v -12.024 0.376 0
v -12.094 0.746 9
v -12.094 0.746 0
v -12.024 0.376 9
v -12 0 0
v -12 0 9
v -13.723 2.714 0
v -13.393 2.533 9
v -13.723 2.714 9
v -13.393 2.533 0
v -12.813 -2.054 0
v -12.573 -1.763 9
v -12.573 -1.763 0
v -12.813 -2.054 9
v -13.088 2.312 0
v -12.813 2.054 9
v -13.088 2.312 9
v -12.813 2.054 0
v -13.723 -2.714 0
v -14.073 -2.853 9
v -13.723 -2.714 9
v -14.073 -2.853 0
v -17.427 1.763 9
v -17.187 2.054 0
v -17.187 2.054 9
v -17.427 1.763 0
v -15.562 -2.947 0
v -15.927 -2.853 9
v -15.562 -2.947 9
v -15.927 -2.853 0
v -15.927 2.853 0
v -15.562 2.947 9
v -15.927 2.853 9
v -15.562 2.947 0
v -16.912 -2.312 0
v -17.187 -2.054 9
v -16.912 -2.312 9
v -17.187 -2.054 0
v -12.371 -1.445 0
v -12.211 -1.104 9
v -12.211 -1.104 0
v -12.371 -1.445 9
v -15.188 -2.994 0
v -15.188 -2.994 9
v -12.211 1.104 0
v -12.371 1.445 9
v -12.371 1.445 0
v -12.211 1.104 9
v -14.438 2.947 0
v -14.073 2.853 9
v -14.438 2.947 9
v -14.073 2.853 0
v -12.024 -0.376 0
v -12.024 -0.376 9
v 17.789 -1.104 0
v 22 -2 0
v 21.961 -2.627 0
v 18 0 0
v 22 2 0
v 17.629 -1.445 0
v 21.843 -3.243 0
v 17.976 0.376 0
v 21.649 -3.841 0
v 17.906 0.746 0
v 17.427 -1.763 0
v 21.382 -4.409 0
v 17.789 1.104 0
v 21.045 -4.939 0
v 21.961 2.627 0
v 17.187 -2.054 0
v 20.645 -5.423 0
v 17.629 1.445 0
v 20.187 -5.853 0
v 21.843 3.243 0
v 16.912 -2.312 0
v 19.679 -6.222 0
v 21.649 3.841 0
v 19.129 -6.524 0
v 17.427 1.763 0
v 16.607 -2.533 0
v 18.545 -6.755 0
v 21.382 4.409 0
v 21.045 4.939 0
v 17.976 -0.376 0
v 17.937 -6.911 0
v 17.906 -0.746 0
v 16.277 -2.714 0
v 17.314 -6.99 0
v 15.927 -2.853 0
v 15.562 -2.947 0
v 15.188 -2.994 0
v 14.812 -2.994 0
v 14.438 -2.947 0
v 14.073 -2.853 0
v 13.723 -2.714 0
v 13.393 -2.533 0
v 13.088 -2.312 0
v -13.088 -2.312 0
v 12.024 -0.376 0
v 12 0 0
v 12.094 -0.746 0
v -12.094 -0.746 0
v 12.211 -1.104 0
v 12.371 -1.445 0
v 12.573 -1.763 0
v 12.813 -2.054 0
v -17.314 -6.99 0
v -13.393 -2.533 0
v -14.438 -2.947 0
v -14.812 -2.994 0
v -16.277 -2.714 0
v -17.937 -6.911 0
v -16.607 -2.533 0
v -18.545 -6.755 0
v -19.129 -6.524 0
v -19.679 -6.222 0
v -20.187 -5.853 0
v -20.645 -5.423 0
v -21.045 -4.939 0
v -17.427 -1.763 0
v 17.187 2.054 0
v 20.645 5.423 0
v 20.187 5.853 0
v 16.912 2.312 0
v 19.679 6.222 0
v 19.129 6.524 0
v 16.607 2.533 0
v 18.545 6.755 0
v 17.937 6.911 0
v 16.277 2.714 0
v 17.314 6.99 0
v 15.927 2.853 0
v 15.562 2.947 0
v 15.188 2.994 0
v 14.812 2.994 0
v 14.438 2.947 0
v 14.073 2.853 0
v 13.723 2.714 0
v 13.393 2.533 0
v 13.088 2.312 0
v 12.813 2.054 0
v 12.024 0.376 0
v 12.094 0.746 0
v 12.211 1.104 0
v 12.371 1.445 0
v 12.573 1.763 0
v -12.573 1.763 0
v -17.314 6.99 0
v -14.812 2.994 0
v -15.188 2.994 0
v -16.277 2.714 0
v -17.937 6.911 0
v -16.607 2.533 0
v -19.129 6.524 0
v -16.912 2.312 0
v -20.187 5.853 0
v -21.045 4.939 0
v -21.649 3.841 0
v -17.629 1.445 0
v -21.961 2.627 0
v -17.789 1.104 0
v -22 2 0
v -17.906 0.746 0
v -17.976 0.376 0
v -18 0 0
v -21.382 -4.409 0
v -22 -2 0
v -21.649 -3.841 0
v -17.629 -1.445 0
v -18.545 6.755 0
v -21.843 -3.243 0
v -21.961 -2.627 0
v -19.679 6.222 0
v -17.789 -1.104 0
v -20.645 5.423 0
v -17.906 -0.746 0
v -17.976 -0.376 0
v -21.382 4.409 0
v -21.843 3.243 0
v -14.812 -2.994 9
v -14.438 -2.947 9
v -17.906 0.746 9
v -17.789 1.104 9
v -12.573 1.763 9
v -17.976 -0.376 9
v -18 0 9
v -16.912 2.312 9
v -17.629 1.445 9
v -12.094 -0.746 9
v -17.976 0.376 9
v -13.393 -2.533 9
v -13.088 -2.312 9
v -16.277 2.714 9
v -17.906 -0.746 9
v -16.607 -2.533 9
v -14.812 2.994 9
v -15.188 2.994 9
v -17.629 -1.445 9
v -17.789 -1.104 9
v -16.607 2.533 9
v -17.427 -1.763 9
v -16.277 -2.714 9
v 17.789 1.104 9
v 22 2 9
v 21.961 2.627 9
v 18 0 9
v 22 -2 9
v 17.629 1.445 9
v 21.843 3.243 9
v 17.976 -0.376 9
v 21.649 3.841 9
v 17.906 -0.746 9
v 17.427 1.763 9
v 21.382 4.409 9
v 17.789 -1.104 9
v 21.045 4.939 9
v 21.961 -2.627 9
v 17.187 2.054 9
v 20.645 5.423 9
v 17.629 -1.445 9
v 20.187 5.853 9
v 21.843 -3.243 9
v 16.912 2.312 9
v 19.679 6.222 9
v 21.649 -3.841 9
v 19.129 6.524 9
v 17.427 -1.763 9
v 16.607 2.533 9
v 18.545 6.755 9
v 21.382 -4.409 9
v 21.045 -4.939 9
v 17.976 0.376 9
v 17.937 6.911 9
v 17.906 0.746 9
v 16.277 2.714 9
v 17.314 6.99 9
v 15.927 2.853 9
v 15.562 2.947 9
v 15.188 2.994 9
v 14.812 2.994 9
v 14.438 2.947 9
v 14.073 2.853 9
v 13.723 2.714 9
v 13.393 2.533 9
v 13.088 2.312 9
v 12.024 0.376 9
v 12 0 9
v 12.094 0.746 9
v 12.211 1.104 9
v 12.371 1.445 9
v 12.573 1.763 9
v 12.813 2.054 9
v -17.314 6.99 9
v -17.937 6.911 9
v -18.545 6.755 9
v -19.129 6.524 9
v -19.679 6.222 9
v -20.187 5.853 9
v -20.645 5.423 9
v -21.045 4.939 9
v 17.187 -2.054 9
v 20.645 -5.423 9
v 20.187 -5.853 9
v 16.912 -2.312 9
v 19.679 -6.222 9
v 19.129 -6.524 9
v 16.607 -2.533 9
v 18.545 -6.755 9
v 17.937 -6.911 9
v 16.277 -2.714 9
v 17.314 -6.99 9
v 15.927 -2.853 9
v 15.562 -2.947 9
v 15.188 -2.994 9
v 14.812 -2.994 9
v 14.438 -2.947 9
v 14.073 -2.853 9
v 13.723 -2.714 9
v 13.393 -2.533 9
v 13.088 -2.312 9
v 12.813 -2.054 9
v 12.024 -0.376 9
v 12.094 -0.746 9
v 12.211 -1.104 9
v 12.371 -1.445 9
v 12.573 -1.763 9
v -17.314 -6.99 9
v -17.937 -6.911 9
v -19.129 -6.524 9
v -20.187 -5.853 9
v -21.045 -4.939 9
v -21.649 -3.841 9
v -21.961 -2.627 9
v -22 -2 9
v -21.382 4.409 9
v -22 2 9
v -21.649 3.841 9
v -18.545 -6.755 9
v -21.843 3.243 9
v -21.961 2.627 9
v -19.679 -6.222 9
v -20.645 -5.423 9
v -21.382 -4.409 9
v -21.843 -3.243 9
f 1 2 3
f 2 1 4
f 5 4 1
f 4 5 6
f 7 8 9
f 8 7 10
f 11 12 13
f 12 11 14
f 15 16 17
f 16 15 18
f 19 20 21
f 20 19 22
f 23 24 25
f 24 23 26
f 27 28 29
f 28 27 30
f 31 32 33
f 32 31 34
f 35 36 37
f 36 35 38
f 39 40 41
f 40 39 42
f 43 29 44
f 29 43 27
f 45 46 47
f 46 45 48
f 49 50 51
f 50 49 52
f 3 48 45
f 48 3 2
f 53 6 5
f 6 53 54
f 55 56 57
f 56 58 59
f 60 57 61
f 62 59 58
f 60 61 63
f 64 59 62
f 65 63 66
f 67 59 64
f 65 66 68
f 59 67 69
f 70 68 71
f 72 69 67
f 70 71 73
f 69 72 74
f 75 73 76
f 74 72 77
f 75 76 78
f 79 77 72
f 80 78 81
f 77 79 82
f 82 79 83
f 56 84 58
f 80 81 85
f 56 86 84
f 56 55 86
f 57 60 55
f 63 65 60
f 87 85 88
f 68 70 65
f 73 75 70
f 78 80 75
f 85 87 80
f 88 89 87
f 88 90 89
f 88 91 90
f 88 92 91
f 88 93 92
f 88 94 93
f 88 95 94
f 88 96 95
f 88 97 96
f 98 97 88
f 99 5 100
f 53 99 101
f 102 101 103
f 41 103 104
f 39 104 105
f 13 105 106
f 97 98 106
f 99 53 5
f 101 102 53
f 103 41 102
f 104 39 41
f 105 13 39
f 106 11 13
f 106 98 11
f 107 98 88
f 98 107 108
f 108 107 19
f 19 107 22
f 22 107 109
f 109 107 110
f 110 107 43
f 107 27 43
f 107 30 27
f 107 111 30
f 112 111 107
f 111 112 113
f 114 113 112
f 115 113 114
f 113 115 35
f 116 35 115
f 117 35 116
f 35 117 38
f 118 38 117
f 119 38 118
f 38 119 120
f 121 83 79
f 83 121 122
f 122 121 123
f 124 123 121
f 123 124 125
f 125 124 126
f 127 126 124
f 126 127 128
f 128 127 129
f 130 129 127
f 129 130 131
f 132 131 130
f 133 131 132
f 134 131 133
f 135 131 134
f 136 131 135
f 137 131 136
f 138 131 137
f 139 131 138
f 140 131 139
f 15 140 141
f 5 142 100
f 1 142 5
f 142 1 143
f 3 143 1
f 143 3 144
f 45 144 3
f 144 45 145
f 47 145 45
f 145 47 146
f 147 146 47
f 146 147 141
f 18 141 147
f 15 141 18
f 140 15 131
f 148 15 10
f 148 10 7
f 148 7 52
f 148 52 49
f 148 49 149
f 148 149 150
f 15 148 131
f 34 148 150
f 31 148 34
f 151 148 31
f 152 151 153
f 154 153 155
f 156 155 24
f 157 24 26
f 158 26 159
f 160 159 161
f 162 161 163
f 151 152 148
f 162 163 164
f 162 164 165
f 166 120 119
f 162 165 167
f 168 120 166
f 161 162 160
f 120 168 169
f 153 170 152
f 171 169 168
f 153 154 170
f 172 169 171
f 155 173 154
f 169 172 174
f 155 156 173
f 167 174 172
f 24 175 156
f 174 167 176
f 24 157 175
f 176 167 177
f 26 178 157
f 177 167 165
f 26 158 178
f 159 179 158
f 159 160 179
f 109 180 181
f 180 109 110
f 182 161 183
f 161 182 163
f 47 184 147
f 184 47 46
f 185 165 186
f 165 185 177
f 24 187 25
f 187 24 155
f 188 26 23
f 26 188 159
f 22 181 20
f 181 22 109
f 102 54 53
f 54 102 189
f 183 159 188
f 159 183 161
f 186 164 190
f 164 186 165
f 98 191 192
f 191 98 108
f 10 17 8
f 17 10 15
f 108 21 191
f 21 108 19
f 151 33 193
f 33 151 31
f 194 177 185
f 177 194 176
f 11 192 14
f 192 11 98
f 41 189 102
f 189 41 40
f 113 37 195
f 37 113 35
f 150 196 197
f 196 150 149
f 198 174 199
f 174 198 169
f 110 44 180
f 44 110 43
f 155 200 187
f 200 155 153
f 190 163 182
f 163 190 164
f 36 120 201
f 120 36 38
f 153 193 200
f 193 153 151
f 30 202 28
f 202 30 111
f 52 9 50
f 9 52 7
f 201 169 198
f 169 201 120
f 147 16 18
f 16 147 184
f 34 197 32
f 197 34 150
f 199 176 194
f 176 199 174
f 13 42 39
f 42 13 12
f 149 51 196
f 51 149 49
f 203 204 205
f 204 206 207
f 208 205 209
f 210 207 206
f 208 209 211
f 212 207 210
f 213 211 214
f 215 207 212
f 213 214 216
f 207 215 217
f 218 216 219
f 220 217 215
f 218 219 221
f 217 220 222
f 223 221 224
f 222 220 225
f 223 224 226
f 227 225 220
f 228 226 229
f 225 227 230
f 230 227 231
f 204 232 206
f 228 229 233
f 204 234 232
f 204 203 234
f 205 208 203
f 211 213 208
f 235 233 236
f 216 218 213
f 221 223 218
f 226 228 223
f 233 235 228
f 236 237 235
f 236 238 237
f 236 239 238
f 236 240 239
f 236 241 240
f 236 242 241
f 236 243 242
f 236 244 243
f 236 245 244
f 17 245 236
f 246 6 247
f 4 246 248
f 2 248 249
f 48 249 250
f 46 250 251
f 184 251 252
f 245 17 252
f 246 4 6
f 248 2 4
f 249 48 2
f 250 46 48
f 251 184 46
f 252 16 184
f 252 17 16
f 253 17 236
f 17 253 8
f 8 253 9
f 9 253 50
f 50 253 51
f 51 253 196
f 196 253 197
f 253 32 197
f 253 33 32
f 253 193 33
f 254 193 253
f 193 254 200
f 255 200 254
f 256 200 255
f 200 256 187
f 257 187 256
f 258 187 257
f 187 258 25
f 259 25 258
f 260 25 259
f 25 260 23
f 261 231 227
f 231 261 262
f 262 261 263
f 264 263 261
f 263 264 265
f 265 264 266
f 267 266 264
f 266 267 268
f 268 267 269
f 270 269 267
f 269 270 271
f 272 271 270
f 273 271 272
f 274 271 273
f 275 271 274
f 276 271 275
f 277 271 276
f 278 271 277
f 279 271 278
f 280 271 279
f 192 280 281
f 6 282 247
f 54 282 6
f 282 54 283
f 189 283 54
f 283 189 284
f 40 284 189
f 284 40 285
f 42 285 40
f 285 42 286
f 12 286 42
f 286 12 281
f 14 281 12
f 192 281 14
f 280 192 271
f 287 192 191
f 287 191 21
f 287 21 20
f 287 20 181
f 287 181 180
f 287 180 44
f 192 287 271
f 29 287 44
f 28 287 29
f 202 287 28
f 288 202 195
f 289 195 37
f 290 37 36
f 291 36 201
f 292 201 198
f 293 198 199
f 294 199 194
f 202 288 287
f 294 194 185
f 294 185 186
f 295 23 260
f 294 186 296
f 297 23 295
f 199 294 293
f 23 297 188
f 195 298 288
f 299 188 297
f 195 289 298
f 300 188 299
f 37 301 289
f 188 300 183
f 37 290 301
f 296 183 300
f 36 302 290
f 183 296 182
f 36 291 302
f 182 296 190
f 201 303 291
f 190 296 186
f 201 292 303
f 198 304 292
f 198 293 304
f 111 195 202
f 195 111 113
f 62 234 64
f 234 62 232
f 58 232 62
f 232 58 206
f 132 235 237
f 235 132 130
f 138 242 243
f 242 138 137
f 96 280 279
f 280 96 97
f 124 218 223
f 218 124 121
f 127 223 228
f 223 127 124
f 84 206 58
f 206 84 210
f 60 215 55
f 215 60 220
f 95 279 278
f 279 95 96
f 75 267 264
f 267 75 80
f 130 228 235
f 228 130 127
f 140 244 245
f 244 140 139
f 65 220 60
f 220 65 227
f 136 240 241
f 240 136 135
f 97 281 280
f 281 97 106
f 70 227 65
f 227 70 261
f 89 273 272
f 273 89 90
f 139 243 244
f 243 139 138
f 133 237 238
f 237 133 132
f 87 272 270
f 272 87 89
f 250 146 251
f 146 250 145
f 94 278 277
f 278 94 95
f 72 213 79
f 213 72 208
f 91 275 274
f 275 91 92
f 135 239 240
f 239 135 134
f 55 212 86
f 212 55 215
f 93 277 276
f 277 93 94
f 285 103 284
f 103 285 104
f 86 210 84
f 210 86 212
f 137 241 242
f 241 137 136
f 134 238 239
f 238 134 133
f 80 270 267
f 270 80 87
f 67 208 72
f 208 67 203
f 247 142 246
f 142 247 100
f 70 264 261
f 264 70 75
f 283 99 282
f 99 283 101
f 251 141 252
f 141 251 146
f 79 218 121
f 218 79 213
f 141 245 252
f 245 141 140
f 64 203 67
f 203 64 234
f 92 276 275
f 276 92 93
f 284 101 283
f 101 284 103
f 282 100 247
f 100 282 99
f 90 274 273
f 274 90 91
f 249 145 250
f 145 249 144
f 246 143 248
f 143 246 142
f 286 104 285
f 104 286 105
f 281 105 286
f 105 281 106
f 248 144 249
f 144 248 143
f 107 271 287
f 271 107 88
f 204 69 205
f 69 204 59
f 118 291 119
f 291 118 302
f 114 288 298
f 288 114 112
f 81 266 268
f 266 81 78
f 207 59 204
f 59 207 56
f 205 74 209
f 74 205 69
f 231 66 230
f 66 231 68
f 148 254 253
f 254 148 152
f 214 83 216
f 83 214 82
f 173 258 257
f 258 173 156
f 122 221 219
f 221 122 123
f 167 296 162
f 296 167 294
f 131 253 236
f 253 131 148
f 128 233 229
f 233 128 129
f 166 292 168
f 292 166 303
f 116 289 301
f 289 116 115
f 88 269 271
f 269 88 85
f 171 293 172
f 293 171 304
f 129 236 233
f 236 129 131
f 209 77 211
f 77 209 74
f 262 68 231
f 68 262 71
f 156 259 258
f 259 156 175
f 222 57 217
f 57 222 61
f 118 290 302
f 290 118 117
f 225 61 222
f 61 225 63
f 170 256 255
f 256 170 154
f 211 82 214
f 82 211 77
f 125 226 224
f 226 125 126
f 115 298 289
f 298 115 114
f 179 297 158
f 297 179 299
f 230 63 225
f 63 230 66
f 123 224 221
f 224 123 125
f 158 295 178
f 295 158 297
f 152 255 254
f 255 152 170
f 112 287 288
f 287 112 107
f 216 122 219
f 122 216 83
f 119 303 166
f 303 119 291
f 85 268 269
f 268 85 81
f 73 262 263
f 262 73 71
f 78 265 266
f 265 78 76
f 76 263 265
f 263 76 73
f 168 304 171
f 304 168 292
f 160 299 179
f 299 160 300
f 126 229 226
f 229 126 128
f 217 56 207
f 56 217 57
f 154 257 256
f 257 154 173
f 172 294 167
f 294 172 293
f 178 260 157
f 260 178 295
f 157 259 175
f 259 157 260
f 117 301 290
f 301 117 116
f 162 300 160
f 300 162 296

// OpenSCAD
$fn = 50;


difference() {
	union() {
		hull() {
			translate(v = [-17.0000000000, 2.0000000000, 0]) {
				cylinder(h = 9, r = 5);
			}
			translate(v = [17.0000000000, 2.0000000000, 0]) {
				cylinder(h = 9, r = 5);
			}
			translate(v = [-17.0000000000, -2.0000000000, 0]) {
				cylinder(h = 9, r = 5);
			}
			translate(v = [17.0000000000, -2.0000000000, 0]) {
				cylinder(h = 9, r = 5);
			}
		}
	}
	union() {
		translate(v = [-15.0000000000, 0.0000000000, 0]) {
			cylinder(h = 9, r = 3.0000000000);
		}
		translate(v = [15.0000000000, 0.0000000000, 0]) {
			cylinder(h = 9, r = 3.0000000000);
		}
		translate(v = [-15.0000000000, 0.0000000000, 0]) {
			cylinder(h = 9, r = 1.5000000000);
		}
		translate(v = [15.0000000000, 0.0000000000, 0]) {
			cylinder(h = 9, r = 1.5000000000);
		}
		translate(v = [-15.0000000000, 0.0000000000, 0]) {
			cylinder(h = 9, r = 1.5000000000);
		}
		translate(v = [15.0000000000, 0.0000000000, 0]) {
			cylinder(h = 9, r = 1.5000000000);
		}
		translate(v = [-15.0000000000, 0.0000000000, 0]) {
			cylinder(h = 9, r = 1.5000000000);
		}
		translate(v = [15.0000000000, 0.0000000000, 0]) {
			cylinder(h = 9, r = 1.5000000000);
		}
	}
}
